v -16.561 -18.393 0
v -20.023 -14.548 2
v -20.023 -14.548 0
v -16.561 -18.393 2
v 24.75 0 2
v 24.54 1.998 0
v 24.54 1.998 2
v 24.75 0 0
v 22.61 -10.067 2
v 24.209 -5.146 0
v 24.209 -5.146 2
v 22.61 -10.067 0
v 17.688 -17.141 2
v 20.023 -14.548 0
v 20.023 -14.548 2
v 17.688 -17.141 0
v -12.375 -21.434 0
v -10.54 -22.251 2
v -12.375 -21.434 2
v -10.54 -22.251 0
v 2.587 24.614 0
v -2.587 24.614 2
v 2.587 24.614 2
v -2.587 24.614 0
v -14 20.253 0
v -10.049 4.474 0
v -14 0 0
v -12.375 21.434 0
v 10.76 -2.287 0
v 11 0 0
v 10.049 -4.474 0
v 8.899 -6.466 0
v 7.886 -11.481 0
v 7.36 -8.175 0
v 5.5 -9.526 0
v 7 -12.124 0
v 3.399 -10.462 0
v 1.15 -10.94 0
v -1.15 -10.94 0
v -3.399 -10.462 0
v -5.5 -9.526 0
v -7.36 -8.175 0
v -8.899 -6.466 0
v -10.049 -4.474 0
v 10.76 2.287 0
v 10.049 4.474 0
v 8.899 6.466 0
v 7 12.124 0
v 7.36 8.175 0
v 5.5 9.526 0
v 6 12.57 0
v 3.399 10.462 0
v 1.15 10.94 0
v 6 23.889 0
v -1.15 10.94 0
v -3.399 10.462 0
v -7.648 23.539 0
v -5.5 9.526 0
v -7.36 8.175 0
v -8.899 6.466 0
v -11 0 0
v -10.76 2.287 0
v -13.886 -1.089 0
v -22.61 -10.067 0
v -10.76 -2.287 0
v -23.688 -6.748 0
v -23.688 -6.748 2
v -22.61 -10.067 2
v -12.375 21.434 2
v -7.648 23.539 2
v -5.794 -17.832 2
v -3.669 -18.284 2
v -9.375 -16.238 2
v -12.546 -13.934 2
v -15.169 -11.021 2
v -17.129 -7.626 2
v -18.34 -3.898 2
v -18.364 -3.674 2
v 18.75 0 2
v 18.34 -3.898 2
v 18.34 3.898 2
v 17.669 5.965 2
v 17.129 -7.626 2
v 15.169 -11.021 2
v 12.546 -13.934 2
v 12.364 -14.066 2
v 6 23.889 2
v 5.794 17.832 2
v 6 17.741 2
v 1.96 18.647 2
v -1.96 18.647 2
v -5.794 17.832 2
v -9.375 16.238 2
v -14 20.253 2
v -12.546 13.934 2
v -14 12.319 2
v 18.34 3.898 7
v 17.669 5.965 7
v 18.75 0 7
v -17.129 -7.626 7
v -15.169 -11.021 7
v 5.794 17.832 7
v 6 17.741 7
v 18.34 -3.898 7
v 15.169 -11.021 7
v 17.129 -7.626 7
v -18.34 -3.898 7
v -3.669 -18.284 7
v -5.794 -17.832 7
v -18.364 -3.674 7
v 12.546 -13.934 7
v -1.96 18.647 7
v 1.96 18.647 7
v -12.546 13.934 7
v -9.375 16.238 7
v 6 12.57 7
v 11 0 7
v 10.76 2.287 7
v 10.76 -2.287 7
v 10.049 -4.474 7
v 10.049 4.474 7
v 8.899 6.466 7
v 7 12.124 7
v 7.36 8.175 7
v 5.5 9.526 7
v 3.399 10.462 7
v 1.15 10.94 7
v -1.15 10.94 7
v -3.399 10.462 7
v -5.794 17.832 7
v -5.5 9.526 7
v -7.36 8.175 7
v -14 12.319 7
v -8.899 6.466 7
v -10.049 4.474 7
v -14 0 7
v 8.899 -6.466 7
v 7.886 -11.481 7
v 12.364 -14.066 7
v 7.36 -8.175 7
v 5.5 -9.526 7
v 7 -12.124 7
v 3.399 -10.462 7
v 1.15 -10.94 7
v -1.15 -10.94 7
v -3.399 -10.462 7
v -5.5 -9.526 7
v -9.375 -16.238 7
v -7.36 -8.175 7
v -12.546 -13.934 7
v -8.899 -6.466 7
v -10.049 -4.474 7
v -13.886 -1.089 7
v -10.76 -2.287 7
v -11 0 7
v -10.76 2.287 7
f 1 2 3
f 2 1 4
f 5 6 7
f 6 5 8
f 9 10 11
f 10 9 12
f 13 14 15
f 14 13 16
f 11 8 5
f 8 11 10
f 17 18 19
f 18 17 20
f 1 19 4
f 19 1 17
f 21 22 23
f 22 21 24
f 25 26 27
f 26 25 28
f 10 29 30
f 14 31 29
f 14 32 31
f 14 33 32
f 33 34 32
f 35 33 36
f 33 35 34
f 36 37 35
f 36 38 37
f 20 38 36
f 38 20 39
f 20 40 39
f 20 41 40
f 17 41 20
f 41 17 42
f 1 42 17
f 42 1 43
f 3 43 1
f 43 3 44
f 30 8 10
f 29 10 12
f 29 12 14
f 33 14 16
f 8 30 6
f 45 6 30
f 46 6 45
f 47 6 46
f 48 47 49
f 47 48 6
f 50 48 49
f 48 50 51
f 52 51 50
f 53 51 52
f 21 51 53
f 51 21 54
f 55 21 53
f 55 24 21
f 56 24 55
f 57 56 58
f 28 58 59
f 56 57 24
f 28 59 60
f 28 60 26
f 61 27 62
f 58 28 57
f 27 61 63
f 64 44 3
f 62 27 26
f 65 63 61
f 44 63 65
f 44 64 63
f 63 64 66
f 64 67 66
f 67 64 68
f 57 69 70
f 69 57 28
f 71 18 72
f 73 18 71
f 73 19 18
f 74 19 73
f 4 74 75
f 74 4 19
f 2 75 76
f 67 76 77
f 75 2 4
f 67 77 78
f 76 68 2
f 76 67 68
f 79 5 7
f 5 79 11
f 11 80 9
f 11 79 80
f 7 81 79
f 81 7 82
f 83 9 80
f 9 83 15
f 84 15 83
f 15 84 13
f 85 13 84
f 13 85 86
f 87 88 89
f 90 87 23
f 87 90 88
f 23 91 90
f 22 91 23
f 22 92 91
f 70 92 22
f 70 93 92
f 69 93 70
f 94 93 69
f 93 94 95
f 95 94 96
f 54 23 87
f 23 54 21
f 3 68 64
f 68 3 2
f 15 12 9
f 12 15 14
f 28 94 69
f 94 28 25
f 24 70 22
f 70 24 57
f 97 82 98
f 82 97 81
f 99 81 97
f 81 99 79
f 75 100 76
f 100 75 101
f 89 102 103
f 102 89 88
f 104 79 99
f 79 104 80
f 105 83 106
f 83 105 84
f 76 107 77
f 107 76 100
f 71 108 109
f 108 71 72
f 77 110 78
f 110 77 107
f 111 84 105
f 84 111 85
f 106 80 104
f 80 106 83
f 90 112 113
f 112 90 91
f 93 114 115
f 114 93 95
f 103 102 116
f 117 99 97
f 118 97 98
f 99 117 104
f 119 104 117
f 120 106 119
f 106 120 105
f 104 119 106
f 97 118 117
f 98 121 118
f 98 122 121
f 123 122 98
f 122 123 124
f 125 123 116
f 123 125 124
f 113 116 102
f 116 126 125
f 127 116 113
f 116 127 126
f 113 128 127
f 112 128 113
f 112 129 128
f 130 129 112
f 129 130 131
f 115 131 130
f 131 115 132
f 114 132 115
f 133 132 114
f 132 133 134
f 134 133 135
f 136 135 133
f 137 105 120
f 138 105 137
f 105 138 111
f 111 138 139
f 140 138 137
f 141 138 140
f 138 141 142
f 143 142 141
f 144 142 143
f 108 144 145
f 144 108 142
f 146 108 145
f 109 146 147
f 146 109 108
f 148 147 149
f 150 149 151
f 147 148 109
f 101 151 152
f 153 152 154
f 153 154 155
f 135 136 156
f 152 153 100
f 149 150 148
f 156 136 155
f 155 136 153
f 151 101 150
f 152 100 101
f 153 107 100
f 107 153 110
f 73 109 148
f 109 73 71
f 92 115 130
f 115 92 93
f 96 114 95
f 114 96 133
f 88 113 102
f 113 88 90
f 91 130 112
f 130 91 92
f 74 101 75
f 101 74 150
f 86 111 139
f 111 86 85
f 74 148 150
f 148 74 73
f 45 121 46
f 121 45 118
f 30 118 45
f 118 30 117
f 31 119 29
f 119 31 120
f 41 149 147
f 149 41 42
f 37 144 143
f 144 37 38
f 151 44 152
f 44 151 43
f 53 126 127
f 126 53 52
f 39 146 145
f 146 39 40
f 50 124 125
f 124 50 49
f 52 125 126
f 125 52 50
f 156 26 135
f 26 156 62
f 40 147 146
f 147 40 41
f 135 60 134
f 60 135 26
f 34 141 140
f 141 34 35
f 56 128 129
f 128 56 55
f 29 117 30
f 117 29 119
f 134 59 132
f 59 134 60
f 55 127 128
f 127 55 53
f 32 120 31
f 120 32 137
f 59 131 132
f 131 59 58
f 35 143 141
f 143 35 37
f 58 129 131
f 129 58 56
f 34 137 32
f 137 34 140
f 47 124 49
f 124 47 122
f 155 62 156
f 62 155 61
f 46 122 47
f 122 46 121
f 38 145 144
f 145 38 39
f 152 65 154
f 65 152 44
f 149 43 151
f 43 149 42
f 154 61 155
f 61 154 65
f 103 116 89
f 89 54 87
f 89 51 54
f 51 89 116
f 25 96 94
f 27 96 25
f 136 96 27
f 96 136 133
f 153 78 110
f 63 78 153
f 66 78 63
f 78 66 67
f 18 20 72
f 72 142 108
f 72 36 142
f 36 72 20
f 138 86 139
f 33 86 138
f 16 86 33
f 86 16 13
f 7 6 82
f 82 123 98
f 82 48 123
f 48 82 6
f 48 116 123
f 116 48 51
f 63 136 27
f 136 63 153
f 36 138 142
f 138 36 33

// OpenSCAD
spool_id = 37.5; // 53 for Peak Green, 37.5 for Monoprice
flange_size = 6;

intersection() {

difference() {
  union() {
    cylinder(h=2, r=(spool_id+2*flange_size)/2);
    cylinder(h=7, r=spool_id/2);

  }

  translate([0,0,-1])
    cylinder(h=20, r=22/2, $fn=30);
}

 union() {
    cylinder(h=13, r=28/2);

    for (i = [0,120,240]) {
      rotate([0,0,i])
      translate([-14,0,0])
	cube([20,100,50]);
    }

    // removed this ring because it allows us to fit this two-up on
    // the Simple
    /*    difference() {
      cylinder(h=2, r=65/2);
      cylinder(h=10, r=53/2);
      } */

 }
}
